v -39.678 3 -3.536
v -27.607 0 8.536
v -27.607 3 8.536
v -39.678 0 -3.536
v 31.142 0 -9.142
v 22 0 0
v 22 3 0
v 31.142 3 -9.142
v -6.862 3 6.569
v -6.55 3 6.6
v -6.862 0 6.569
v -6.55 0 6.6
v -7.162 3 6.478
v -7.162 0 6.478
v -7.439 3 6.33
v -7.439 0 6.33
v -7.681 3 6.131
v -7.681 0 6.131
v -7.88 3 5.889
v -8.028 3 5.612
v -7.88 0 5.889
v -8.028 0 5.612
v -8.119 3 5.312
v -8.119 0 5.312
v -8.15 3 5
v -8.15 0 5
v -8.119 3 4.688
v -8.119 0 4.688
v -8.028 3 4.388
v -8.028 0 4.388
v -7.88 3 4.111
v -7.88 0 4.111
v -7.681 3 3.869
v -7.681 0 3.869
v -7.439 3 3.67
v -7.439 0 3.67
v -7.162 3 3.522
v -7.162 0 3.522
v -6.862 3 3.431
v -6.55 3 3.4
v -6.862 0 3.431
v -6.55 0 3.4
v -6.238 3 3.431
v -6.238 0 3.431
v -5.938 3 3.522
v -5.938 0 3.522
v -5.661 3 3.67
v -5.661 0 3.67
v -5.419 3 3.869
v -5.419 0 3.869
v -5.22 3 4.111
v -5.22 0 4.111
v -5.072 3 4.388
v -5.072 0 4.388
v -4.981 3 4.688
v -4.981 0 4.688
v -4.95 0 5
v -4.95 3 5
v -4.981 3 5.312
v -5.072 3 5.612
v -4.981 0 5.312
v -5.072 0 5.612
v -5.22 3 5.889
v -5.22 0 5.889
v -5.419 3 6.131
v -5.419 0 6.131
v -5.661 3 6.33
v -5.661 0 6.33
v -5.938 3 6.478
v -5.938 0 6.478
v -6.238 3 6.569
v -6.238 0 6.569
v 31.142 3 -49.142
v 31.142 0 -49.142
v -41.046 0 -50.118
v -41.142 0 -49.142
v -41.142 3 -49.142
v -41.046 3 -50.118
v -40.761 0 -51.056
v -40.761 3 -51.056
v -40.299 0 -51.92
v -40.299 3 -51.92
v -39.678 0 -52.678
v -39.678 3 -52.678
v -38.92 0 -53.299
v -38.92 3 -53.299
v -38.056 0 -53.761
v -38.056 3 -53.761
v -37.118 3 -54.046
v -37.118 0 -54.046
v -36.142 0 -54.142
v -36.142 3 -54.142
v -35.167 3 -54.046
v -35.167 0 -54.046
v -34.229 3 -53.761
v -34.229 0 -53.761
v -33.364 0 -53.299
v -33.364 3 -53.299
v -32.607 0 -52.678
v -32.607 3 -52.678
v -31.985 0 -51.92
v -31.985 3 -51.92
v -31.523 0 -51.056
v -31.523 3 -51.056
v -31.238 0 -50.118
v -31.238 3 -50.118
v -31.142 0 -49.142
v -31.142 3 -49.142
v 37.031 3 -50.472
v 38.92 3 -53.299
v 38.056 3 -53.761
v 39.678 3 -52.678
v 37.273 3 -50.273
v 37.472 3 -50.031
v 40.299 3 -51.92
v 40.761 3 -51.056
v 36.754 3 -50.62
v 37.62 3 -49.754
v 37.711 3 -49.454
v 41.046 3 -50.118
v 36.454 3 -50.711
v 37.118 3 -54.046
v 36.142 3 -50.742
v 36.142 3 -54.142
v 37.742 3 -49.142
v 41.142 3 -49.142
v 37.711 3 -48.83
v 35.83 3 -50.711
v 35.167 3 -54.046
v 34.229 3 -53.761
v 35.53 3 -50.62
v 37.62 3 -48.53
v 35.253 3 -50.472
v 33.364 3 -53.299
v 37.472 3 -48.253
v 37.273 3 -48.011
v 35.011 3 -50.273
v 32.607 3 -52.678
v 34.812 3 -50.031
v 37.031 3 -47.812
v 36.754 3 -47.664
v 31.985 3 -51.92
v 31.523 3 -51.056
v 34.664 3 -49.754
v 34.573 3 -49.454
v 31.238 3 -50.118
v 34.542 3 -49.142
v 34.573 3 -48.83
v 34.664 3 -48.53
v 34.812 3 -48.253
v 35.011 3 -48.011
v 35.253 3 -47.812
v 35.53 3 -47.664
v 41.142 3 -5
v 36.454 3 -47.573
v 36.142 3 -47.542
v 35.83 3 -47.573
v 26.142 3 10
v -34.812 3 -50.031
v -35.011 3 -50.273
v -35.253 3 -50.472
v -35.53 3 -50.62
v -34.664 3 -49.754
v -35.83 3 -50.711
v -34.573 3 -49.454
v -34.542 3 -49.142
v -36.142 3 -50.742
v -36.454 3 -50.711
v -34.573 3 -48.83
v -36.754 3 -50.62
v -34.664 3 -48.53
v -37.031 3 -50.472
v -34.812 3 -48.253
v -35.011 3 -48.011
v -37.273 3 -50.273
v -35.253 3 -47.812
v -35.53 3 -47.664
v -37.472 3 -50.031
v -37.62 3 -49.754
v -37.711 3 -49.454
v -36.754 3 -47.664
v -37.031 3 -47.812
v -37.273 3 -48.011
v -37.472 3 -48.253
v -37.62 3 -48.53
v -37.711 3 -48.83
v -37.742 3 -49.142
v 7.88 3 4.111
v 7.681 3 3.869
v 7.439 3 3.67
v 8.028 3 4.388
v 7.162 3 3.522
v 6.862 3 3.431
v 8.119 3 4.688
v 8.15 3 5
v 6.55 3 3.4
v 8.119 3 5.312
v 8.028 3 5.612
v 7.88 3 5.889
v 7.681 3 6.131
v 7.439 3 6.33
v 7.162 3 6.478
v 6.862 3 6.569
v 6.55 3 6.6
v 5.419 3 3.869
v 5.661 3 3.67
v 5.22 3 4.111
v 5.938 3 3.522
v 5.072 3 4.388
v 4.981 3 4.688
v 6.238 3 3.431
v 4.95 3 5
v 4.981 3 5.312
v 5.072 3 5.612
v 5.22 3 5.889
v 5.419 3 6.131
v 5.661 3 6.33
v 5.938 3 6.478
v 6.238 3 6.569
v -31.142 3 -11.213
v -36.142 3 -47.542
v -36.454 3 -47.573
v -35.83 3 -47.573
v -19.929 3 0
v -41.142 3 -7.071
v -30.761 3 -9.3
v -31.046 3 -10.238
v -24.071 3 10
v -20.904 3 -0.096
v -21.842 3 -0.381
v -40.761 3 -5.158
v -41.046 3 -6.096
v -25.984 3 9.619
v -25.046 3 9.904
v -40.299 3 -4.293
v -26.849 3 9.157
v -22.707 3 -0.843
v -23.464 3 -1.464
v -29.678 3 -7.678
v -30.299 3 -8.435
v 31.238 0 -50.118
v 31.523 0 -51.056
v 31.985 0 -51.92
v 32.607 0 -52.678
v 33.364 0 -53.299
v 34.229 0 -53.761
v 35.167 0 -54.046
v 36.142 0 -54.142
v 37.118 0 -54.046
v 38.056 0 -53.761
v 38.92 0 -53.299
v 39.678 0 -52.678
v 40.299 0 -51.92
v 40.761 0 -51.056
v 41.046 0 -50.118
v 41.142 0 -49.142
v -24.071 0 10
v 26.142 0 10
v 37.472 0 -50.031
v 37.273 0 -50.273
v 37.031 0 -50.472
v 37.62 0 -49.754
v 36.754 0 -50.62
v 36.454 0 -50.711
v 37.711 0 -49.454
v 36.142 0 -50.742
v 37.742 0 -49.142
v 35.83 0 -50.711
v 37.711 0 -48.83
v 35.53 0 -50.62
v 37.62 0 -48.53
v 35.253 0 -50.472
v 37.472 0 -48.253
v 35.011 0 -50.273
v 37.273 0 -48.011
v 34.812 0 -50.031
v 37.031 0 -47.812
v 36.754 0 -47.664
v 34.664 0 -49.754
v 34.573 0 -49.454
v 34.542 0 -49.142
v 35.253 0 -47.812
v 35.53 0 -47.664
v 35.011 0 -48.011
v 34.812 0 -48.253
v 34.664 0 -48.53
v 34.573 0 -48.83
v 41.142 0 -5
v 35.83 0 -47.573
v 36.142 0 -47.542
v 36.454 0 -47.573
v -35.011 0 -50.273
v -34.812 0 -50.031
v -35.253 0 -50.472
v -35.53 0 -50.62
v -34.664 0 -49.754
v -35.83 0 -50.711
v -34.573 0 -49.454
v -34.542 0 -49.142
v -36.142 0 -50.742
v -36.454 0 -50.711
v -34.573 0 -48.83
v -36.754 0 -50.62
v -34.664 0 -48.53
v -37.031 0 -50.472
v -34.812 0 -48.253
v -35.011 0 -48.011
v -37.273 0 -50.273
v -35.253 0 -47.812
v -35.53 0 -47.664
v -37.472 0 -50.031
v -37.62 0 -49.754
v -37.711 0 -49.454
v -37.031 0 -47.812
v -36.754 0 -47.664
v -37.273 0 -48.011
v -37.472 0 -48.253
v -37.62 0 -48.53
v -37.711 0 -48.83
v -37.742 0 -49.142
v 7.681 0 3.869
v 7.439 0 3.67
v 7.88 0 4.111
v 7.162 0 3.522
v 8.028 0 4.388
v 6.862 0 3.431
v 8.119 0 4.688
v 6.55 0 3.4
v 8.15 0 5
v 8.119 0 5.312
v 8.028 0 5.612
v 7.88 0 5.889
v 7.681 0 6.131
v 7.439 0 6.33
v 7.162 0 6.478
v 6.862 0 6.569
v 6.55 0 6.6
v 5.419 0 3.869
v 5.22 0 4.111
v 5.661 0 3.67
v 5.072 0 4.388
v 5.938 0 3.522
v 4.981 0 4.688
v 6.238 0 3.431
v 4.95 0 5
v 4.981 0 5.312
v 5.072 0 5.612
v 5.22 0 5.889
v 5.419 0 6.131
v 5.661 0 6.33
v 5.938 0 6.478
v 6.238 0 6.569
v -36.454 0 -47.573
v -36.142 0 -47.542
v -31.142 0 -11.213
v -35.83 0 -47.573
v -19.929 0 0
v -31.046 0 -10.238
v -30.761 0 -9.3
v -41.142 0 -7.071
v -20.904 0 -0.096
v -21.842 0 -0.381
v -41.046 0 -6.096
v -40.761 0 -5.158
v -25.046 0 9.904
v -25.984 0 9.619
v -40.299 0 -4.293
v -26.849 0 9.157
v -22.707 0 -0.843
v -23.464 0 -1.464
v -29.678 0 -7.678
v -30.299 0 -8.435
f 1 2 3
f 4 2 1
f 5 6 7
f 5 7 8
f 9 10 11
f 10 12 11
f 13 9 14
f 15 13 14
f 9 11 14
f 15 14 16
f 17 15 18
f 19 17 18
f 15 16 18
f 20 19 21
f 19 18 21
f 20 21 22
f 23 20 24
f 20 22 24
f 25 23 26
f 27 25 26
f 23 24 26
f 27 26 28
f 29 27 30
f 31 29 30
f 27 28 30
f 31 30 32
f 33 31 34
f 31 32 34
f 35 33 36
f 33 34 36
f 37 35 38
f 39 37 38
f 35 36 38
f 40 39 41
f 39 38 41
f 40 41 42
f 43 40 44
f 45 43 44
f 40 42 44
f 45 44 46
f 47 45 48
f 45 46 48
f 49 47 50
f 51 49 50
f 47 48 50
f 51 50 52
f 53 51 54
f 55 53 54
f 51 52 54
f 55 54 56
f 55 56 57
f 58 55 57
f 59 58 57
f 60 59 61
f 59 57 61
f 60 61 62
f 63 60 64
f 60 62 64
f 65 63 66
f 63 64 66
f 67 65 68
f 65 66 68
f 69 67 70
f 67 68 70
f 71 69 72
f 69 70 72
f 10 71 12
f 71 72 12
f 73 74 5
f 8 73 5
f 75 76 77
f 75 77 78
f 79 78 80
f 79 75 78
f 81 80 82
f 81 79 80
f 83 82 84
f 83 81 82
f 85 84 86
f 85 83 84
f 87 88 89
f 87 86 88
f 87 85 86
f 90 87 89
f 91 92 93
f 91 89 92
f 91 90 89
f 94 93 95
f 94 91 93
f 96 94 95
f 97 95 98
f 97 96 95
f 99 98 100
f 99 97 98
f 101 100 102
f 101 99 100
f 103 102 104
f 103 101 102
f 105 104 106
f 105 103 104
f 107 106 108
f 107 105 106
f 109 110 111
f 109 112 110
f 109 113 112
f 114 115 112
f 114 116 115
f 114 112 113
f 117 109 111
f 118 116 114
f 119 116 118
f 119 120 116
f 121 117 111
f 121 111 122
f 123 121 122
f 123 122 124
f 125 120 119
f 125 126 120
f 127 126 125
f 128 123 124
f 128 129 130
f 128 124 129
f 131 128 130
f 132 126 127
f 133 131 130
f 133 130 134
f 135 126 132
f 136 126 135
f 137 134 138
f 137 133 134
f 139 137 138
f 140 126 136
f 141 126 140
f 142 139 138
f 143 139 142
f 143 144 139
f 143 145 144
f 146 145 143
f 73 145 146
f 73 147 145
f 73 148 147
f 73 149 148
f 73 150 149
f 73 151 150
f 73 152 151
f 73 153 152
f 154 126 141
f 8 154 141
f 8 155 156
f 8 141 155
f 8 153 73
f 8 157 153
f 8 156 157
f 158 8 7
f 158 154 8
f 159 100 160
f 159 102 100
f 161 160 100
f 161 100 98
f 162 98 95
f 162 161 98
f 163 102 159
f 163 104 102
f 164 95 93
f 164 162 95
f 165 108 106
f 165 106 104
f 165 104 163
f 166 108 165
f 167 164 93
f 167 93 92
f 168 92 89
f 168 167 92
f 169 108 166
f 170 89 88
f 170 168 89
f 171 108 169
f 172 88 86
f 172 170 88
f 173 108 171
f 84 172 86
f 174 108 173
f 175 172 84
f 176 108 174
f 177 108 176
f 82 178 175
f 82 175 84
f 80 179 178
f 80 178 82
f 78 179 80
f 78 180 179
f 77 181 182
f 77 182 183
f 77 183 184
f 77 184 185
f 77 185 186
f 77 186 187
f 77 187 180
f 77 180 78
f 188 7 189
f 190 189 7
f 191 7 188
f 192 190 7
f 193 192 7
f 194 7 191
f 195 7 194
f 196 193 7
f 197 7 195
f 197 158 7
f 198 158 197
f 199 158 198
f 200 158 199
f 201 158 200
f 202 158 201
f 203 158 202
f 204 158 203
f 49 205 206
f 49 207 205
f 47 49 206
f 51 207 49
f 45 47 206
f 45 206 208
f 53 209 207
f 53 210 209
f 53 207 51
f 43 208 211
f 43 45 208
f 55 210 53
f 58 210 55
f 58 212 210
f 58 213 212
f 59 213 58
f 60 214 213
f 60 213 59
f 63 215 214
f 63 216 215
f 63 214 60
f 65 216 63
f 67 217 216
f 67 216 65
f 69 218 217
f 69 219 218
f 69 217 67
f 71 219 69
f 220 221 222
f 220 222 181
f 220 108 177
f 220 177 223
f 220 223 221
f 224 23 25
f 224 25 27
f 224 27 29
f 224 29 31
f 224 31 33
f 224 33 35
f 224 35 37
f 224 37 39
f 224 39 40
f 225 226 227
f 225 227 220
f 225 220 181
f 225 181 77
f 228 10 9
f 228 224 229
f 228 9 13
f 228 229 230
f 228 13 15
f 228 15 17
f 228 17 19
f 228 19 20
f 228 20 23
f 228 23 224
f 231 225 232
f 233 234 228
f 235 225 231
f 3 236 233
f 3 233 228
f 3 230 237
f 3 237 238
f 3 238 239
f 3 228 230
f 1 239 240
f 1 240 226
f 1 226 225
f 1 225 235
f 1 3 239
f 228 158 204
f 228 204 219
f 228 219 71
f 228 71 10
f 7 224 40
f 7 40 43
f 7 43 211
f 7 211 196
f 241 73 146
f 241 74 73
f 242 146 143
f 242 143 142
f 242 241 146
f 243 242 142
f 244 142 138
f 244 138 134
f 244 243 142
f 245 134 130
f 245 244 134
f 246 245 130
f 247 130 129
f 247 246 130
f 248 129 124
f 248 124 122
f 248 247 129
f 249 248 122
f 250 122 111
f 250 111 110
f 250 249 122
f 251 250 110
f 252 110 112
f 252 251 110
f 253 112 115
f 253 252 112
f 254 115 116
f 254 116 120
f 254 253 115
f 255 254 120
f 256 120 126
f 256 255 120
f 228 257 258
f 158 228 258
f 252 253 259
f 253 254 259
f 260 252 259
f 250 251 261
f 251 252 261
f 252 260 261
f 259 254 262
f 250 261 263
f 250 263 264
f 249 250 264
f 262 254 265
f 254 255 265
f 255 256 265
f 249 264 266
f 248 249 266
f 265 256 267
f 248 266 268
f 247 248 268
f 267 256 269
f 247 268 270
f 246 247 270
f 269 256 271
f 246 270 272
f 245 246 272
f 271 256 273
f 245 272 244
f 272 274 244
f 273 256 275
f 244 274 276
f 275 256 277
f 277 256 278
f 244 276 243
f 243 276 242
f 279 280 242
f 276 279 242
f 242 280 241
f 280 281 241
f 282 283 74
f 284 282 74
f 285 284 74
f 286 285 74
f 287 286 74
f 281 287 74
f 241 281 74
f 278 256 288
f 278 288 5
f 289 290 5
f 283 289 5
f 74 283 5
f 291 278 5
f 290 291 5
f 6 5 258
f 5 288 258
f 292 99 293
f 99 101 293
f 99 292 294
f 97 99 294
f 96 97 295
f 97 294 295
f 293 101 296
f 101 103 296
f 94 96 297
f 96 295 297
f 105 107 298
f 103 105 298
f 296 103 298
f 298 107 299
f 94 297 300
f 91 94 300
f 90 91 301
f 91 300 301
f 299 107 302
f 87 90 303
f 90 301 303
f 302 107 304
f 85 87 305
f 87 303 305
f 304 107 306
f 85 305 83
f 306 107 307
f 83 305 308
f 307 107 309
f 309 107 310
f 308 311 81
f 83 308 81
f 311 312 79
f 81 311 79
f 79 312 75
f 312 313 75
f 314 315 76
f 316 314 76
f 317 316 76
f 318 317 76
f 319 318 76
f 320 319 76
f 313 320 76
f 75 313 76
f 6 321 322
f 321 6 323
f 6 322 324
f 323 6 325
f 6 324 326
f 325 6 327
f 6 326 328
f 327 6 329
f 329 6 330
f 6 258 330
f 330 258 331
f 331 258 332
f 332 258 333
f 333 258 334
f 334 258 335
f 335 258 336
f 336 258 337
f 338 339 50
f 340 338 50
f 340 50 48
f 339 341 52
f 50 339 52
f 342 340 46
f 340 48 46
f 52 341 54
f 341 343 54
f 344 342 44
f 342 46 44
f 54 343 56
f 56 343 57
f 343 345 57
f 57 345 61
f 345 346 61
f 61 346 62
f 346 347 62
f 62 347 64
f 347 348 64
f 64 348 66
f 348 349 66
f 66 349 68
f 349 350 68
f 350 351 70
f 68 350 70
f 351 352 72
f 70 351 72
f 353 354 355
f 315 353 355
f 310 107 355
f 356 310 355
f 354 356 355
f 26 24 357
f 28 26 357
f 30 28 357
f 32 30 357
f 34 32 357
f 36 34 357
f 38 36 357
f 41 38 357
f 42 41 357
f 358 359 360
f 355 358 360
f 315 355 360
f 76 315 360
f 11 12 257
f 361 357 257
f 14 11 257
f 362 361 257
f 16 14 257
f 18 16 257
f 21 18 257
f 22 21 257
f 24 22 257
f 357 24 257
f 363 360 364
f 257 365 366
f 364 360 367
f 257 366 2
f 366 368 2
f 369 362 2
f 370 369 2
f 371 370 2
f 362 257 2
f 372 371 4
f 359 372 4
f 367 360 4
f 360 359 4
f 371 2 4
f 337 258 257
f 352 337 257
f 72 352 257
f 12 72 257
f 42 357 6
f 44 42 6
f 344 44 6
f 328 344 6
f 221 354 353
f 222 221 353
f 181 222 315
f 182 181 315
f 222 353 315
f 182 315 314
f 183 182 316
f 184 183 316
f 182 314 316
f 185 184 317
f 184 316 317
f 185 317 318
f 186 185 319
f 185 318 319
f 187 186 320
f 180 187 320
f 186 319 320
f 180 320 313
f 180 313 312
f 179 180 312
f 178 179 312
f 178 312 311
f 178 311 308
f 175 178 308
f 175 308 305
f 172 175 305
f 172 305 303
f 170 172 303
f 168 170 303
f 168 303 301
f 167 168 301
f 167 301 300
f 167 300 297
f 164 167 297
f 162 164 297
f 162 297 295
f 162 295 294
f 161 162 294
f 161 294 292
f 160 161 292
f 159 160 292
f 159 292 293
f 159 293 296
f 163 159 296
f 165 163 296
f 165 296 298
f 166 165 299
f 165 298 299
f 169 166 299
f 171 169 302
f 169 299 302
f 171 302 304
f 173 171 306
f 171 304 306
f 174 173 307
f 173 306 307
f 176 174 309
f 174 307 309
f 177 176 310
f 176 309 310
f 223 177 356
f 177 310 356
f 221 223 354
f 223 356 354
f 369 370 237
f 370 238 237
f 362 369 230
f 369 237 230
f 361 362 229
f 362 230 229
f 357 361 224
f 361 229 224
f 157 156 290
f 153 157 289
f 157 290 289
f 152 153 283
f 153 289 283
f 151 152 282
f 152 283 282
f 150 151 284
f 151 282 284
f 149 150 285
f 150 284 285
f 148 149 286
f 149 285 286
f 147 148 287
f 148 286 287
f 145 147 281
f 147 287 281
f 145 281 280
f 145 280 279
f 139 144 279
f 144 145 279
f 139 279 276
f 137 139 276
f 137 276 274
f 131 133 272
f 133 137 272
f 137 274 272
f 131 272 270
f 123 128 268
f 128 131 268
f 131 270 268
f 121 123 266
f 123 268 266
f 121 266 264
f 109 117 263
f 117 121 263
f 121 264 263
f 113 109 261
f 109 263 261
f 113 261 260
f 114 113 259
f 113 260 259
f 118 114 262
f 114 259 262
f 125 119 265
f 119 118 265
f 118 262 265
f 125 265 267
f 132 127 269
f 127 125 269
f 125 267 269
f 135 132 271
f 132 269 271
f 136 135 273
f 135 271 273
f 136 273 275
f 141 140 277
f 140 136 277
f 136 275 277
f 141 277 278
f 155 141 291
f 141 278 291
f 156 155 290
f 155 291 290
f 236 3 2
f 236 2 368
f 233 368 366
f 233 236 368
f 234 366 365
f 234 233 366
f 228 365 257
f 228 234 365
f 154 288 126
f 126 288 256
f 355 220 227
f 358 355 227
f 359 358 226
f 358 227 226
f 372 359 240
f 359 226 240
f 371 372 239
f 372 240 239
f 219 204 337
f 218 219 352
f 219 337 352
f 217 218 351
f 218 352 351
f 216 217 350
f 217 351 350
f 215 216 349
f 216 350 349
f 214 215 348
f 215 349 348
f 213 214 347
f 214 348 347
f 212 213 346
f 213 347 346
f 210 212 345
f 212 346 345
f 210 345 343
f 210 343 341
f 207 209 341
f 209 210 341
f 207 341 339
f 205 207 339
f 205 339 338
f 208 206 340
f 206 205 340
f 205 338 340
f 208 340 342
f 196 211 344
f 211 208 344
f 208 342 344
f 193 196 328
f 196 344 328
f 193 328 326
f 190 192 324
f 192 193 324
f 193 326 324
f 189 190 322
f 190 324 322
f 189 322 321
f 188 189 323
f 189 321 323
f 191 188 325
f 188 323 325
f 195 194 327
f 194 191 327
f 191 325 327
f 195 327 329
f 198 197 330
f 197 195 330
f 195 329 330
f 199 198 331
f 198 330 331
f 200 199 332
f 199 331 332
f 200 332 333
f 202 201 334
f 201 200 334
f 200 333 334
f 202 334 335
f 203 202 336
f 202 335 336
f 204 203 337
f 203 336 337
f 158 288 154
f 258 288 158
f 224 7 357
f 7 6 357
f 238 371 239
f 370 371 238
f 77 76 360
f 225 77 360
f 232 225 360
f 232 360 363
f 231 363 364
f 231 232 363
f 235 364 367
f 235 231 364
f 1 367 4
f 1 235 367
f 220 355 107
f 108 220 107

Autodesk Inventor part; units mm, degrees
ref_plane "YZ Plane" through (0, 0, 0) normal (1, 0, 0) x (0, 1, 0)
ref_plane "XZ Plane" through (0, 0, 0) normal (0, 1, 0) x (-1, 0, 0)
ref_plane "XY Plane" through (0, 0, 0) normal (0, 0, 1) x (1, 0, 0)
sketch "Sketch3" plane through (0, 0, 0) normal (0, 1, 0) x (-1, 0, 0)
  line L0 (0, 0) -> (22, 0)
  line L1 (31.1421, -9.1421) -> (31.1421, -49.1421)
  line L2 (41.1421, -49.1421) -> (41.1421, -5)
  line L3 (0, 10) -> (0, 0)
  line L4 (26.1421, 10) -> (41.1421, -5)
  line L5 (31.1421, -9.1421) -> (22, 0)
  line L6 (26.1421, 10) -> (0, 10)
  line L7 (22, 0) -> (0, 0)
  line L8 (31.1421, -9.1421) -> (31.1421, -49.1421)
  line L9 (41.1421, -49.1421) -> (41.1421, -5)
  line L10 (22, 0) -> (0, 0)
  arc A0 (31.1421, -49.1421) -> (41.1421, -49.1421) centre (36.1421, -49.1421) ccw
  circle A1 centre (0, -30) radius 30
  point P0 (31.1421, -29.1421)
  dimension "d51" = 10
  dimension "d56" = 10
  dimension "d57" = 15
  dimension "d58" = 15
  dimension "d59" = 5
  dimension "d60" = 22
  dimension "d61" = 40
  dimension "d64" = 10
  dimension "d65" = 10
  dimension "d66" = 60
  dimension "d67" = 30
extrude "Extrusion2" add sketch "Sketch3" along normal blind 3 contours L3 L6 L4 L2 A0 L1 L5 L0
sketch "Sketch4" plane through (0, 3, 0) normal (0, 1, 0) x (1, 0, 0)
  line L0 (0, -10) -> (0, 0) projected
  arc A0 (-31.1421, 49.1421) -> (-41.1421, 49.1421) centre (-36.1421, 49.1421) ccw projected
  point P0 (-6.55, -5)
  point P1 (0, -5)
  point P2 (-36.1421, 54.1421)
  dimension "d77" = 6.55
hole "Hole2" at (-6.55, 3, 5) at (-36.1421, 3, -49.1421) direction (0, -1, 0) diameter 3.2 end through all clearance for "Countersunk Flat Head Screw DIN EN ISO 2009" size "M3" standard "DIN"
fillet "Fillet1" radius 5 4 edges at (-26.1421, 1.5, 10) (-41.1421, 1.5, -5) (-31.1421, 1.5, -9.1421) (-22, 1.5, 0)
mirror "Mirror3" about plane through (0, 0, 10) normal (1, 0, 0) of "Extrusion2", "Hole2"
properties part number "Claw4" material "Copper, Cast"
